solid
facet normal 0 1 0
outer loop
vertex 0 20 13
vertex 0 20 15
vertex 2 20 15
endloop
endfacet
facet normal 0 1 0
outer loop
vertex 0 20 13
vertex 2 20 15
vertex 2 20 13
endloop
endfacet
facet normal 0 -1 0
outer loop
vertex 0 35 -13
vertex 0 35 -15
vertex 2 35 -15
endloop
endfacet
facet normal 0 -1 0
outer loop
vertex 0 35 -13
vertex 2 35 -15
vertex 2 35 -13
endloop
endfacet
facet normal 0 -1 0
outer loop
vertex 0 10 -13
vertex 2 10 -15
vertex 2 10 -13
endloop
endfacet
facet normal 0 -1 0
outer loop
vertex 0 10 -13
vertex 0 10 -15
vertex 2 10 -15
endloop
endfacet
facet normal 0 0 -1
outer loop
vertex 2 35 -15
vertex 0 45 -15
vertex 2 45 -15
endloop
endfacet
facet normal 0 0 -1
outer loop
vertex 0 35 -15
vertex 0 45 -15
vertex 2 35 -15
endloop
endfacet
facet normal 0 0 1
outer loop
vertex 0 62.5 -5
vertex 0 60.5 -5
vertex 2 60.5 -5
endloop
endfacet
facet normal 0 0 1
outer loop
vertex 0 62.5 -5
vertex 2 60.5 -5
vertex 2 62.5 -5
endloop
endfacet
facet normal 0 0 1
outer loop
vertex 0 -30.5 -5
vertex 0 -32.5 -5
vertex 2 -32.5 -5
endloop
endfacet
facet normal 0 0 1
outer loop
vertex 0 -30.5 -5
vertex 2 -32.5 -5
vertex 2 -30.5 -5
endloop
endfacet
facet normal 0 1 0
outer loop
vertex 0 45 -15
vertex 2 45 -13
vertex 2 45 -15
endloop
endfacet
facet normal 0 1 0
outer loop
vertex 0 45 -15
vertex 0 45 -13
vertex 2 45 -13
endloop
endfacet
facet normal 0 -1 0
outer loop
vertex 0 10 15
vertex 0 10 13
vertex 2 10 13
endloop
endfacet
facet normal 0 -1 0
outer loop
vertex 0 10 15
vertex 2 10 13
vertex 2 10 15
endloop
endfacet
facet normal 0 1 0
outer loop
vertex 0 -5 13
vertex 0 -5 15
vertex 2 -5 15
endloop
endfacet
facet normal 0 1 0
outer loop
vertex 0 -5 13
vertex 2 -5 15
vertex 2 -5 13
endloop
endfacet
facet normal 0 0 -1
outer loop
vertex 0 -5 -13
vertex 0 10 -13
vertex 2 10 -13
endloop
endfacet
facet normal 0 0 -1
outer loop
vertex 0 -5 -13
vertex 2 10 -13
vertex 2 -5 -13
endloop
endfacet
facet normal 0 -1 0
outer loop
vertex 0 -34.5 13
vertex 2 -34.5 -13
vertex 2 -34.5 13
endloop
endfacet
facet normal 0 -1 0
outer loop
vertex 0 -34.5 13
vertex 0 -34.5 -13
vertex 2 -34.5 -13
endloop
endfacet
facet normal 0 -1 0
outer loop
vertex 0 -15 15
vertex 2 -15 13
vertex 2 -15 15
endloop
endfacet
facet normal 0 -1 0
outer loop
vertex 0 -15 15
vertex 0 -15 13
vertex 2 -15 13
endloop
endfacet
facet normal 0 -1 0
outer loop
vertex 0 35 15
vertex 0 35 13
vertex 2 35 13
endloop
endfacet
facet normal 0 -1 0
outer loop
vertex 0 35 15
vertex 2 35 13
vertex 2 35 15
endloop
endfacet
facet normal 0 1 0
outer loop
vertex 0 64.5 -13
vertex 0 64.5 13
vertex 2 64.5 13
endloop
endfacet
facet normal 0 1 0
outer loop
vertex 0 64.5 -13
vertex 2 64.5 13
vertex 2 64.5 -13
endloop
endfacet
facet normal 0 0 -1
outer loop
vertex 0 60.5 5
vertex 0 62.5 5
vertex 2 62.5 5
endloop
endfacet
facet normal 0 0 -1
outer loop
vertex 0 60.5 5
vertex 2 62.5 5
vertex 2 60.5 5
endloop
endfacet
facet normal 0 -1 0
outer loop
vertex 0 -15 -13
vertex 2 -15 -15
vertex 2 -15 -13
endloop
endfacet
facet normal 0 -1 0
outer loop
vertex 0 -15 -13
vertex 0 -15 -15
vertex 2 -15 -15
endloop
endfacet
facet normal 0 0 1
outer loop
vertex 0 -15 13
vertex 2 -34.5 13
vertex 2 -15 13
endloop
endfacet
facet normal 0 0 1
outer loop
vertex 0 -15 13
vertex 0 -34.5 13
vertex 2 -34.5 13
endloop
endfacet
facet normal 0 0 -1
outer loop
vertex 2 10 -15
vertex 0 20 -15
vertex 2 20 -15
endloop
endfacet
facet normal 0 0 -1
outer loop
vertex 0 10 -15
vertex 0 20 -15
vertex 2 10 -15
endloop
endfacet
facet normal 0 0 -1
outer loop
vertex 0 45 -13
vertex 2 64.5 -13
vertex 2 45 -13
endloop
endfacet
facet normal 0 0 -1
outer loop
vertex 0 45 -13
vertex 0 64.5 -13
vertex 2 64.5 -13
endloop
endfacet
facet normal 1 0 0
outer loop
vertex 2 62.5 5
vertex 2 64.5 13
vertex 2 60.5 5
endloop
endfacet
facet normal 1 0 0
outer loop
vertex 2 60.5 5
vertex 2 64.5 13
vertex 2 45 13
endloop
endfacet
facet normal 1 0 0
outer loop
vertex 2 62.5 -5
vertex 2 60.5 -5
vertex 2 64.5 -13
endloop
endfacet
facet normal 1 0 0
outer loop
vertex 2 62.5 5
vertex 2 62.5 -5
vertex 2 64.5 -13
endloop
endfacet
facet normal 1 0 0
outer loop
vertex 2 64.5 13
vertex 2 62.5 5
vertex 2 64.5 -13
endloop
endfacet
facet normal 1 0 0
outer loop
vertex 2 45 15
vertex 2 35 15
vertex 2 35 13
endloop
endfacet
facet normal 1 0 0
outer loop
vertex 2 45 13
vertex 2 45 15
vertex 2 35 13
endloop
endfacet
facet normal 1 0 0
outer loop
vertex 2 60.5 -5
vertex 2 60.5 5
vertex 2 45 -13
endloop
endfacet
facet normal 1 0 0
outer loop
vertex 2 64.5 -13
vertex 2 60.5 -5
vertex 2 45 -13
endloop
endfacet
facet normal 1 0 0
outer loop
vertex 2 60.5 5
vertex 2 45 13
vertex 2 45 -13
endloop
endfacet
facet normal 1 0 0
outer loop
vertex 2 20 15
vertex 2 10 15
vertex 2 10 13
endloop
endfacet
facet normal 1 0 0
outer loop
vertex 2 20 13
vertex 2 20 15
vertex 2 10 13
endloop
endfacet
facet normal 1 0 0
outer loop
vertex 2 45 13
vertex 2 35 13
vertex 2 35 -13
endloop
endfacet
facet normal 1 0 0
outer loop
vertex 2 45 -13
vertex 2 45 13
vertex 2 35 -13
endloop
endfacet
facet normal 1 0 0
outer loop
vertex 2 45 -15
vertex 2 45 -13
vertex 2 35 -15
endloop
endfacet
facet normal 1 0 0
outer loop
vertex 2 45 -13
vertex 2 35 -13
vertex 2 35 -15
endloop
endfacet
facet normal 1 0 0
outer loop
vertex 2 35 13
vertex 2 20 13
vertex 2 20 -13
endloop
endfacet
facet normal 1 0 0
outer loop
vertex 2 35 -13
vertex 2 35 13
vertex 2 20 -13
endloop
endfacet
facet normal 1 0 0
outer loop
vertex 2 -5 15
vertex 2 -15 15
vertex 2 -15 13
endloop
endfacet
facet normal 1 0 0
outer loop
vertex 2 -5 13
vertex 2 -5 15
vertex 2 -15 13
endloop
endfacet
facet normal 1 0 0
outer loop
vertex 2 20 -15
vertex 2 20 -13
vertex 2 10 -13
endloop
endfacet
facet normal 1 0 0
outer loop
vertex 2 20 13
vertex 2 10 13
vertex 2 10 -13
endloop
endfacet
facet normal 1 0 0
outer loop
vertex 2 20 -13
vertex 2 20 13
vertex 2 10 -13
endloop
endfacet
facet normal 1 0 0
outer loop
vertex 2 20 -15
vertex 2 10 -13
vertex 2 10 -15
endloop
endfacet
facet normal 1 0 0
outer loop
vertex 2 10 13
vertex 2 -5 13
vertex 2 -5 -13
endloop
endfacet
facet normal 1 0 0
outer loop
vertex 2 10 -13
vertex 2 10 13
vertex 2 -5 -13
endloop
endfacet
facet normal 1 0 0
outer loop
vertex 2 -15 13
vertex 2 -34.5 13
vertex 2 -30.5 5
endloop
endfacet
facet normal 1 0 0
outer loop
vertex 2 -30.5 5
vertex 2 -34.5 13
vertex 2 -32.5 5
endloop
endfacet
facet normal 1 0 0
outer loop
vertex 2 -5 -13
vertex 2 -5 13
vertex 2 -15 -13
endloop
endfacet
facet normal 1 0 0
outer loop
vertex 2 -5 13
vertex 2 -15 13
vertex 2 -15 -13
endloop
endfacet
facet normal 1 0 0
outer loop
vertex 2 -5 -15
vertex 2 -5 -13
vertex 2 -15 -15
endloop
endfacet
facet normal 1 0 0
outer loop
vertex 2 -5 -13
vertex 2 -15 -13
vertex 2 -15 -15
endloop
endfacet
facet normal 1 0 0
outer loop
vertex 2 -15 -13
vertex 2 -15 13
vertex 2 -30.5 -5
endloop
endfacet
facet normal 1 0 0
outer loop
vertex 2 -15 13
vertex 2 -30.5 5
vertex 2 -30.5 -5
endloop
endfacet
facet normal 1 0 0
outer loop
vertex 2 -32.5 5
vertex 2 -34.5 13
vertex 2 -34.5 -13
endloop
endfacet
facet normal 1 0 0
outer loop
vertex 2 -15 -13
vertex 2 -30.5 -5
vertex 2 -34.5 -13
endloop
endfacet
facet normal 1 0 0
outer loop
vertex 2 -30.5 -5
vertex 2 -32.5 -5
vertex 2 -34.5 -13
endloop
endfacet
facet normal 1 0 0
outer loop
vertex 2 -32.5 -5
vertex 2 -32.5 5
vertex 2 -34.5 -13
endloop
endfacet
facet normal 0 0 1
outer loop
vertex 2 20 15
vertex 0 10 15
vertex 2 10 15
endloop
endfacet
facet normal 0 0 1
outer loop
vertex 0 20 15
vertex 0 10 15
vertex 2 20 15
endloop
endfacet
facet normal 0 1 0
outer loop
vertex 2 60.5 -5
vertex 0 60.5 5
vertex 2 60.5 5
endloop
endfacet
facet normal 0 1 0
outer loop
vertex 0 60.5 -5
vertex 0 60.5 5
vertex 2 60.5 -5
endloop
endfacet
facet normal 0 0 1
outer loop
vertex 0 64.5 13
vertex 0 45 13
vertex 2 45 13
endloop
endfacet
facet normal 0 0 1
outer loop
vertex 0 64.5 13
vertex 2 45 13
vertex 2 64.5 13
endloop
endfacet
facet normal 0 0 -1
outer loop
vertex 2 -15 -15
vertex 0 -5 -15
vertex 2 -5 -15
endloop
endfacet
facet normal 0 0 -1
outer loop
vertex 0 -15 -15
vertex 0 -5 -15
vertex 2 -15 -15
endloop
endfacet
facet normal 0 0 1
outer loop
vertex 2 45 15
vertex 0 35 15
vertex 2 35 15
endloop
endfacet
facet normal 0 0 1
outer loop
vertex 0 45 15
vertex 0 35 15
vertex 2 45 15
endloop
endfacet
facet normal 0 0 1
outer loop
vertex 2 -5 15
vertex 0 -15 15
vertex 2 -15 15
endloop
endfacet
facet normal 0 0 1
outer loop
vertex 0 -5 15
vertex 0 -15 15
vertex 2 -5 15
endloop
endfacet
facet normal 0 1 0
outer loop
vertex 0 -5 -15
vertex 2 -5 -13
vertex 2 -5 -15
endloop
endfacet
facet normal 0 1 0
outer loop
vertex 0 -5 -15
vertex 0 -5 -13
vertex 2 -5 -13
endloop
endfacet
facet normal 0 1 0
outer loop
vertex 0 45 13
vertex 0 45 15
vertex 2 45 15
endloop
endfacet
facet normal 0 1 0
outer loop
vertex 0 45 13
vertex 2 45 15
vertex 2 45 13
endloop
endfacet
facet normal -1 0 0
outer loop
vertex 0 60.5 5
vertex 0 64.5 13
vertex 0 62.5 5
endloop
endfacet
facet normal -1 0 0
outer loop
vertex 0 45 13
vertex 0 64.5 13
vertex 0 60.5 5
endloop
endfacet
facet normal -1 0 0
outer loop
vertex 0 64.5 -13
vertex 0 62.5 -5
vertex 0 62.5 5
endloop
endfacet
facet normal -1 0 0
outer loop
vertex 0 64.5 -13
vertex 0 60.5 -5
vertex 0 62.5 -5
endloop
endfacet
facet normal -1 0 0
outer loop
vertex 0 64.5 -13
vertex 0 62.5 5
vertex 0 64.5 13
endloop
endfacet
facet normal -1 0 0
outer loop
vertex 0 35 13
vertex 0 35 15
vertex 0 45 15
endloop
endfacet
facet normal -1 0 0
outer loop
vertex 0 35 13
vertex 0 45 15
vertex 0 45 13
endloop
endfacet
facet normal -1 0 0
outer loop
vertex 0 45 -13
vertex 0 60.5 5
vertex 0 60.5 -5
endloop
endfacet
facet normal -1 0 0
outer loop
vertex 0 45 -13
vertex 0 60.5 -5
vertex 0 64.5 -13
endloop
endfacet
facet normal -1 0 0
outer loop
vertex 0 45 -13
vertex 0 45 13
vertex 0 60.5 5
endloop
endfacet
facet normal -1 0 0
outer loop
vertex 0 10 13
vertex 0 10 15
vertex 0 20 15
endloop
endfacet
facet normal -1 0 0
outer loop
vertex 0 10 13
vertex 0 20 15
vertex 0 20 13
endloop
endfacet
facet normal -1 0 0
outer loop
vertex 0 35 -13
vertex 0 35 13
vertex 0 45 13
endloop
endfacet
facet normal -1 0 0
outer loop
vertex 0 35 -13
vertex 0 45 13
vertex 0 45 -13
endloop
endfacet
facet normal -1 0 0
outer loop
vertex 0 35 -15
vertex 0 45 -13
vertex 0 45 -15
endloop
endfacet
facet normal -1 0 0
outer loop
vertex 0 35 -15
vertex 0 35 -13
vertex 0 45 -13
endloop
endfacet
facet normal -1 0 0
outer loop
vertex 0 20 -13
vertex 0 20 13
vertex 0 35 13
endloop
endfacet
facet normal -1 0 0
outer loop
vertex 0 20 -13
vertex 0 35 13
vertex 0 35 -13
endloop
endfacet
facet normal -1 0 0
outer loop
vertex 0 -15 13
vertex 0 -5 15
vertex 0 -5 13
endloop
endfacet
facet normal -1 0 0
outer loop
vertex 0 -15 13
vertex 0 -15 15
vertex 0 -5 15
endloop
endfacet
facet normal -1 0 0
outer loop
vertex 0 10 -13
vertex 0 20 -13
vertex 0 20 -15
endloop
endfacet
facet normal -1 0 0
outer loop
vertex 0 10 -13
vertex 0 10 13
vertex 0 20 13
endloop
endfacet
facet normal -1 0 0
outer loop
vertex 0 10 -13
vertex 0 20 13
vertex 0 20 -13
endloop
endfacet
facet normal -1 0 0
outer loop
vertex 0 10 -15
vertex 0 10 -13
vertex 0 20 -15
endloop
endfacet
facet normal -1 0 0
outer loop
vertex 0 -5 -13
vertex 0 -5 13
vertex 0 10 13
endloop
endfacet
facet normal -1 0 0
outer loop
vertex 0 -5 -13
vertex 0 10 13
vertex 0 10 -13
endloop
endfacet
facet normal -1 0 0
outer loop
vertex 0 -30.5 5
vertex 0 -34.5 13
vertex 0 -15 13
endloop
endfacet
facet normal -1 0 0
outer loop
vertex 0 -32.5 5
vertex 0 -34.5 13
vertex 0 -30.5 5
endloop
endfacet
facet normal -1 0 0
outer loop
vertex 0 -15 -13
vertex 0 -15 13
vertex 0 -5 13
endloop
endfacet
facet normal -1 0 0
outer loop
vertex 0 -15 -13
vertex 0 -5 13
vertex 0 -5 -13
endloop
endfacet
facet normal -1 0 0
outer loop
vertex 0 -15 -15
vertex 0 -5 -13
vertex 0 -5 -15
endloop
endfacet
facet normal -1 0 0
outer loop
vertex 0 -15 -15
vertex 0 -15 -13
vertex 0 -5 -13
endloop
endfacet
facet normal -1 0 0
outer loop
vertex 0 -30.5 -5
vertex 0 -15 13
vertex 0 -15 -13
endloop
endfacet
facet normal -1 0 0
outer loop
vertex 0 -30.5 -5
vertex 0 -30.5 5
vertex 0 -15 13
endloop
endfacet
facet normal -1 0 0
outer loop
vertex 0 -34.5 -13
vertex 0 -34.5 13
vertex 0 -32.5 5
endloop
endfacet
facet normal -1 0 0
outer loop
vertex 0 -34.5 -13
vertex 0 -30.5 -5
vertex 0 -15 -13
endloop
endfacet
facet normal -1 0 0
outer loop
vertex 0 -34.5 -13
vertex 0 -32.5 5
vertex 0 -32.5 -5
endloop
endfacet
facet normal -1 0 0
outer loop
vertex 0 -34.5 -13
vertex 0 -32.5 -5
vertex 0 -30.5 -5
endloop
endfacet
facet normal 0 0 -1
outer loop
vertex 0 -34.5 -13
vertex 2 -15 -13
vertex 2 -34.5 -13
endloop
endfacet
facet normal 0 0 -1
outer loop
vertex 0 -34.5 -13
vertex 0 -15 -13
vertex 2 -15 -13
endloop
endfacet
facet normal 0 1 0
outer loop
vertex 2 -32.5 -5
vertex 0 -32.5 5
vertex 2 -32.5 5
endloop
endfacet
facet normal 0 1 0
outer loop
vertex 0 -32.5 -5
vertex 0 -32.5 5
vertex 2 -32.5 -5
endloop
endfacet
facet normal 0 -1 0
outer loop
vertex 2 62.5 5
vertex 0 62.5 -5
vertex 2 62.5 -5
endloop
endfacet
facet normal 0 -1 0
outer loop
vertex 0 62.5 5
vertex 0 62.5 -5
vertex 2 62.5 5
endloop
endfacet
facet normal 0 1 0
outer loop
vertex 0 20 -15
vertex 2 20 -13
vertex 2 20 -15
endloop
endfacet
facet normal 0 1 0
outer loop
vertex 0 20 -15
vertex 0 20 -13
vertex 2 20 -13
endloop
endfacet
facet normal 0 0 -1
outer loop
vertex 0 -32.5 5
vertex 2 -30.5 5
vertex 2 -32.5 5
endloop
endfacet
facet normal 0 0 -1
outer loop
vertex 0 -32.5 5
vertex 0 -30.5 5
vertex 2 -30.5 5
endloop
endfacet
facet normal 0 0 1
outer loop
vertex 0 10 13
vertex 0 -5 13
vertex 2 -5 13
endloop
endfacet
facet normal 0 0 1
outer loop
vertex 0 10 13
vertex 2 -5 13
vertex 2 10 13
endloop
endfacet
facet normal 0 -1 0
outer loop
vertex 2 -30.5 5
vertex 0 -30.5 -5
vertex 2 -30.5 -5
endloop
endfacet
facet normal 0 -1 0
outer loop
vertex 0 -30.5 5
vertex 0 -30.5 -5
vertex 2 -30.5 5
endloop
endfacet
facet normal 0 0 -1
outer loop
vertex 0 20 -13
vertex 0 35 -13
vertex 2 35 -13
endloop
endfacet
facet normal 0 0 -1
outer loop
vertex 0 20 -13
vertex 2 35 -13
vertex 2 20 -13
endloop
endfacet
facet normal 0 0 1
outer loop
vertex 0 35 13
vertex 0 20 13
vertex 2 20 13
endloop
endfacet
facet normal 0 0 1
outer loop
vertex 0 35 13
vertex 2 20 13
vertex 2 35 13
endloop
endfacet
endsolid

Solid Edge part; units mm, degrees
sketch "Sketch1" plane through (0, 0, 0) normal (1, 0, 0) x (0, 1, 0)
  line L0 (64.5, -13) -> (45, -13)
  line L1 (45, -13) -> (45, -15)
  line L2 (45, -15) -> (35, -15)
  line L3 (35, -15) -> (35, -13)
  line L4 (35, -13) -> (20, -13)
  line L5 (20, -13) -> (20, -15)
  line L6 (20, -15) -> (10, -15)
  line L7 (10, -15) -> (10, -13)
  line L8 (10, -13) -> (-5, -13)
  line L9 (-5, -13) -> (-5, -15)
  line L10 (-5, -15) -> (-15, -15)
  line L11 (-15, -15) -> (-15, -13)
  line L12 (-15, -13) -> (-34.5, -13)
  line L13 (-34.5, -13) -> (-34.5, 13)
  line L14 (-34.5, 13) -> (-15, 13)
  line L15 (-15, 13) -> (-15, 15)
  line L16 (-15, 15) -> (-5, 15)
  line L17 (-5, 15) -> (-5, 13)
  line L18 (-5, 13) -> (10, 13)
  line L19 (10, 13) -> (10, 15)
  line L20 (10, 15) -> (20, 15)
  line L21 (20, 15) -> (20, 13)
  line L22 (20, 13) -> (35, 13)
  line L23 (35, 13) -> (35, 15)
  line L24 (35, 15) -> (45, 15)
  line L25 (45, 15) -> (45, 13)
  line L26 (45, 13) -> (64.5, 13)
  line L27 (64.5, 13) -> (64.5, -13)
  line L28 (-32.5, -5) -> (-30.5, -5)
  line L29 (-32.5, 5) -> (-32.5, -5)
  line L30 (-30.5, 5) -> (-32.5, 5)
  line L31 (-30.5, -5) -> (-30.5, 5)
  line L32 (62.5, -5) -> (62.5, 5)
  line L33 (60.5, -5) -> (62.5, -5)
  line L34 (60.5, 5) -> (60.5, -5)
  line L35 (62.5, 5) -> (60.5, 5)
extrude "ExtrudedProtrusion_1" add sketch "Sketch1" along normal blind 2
properties material "Acrylic, high impact grade"
